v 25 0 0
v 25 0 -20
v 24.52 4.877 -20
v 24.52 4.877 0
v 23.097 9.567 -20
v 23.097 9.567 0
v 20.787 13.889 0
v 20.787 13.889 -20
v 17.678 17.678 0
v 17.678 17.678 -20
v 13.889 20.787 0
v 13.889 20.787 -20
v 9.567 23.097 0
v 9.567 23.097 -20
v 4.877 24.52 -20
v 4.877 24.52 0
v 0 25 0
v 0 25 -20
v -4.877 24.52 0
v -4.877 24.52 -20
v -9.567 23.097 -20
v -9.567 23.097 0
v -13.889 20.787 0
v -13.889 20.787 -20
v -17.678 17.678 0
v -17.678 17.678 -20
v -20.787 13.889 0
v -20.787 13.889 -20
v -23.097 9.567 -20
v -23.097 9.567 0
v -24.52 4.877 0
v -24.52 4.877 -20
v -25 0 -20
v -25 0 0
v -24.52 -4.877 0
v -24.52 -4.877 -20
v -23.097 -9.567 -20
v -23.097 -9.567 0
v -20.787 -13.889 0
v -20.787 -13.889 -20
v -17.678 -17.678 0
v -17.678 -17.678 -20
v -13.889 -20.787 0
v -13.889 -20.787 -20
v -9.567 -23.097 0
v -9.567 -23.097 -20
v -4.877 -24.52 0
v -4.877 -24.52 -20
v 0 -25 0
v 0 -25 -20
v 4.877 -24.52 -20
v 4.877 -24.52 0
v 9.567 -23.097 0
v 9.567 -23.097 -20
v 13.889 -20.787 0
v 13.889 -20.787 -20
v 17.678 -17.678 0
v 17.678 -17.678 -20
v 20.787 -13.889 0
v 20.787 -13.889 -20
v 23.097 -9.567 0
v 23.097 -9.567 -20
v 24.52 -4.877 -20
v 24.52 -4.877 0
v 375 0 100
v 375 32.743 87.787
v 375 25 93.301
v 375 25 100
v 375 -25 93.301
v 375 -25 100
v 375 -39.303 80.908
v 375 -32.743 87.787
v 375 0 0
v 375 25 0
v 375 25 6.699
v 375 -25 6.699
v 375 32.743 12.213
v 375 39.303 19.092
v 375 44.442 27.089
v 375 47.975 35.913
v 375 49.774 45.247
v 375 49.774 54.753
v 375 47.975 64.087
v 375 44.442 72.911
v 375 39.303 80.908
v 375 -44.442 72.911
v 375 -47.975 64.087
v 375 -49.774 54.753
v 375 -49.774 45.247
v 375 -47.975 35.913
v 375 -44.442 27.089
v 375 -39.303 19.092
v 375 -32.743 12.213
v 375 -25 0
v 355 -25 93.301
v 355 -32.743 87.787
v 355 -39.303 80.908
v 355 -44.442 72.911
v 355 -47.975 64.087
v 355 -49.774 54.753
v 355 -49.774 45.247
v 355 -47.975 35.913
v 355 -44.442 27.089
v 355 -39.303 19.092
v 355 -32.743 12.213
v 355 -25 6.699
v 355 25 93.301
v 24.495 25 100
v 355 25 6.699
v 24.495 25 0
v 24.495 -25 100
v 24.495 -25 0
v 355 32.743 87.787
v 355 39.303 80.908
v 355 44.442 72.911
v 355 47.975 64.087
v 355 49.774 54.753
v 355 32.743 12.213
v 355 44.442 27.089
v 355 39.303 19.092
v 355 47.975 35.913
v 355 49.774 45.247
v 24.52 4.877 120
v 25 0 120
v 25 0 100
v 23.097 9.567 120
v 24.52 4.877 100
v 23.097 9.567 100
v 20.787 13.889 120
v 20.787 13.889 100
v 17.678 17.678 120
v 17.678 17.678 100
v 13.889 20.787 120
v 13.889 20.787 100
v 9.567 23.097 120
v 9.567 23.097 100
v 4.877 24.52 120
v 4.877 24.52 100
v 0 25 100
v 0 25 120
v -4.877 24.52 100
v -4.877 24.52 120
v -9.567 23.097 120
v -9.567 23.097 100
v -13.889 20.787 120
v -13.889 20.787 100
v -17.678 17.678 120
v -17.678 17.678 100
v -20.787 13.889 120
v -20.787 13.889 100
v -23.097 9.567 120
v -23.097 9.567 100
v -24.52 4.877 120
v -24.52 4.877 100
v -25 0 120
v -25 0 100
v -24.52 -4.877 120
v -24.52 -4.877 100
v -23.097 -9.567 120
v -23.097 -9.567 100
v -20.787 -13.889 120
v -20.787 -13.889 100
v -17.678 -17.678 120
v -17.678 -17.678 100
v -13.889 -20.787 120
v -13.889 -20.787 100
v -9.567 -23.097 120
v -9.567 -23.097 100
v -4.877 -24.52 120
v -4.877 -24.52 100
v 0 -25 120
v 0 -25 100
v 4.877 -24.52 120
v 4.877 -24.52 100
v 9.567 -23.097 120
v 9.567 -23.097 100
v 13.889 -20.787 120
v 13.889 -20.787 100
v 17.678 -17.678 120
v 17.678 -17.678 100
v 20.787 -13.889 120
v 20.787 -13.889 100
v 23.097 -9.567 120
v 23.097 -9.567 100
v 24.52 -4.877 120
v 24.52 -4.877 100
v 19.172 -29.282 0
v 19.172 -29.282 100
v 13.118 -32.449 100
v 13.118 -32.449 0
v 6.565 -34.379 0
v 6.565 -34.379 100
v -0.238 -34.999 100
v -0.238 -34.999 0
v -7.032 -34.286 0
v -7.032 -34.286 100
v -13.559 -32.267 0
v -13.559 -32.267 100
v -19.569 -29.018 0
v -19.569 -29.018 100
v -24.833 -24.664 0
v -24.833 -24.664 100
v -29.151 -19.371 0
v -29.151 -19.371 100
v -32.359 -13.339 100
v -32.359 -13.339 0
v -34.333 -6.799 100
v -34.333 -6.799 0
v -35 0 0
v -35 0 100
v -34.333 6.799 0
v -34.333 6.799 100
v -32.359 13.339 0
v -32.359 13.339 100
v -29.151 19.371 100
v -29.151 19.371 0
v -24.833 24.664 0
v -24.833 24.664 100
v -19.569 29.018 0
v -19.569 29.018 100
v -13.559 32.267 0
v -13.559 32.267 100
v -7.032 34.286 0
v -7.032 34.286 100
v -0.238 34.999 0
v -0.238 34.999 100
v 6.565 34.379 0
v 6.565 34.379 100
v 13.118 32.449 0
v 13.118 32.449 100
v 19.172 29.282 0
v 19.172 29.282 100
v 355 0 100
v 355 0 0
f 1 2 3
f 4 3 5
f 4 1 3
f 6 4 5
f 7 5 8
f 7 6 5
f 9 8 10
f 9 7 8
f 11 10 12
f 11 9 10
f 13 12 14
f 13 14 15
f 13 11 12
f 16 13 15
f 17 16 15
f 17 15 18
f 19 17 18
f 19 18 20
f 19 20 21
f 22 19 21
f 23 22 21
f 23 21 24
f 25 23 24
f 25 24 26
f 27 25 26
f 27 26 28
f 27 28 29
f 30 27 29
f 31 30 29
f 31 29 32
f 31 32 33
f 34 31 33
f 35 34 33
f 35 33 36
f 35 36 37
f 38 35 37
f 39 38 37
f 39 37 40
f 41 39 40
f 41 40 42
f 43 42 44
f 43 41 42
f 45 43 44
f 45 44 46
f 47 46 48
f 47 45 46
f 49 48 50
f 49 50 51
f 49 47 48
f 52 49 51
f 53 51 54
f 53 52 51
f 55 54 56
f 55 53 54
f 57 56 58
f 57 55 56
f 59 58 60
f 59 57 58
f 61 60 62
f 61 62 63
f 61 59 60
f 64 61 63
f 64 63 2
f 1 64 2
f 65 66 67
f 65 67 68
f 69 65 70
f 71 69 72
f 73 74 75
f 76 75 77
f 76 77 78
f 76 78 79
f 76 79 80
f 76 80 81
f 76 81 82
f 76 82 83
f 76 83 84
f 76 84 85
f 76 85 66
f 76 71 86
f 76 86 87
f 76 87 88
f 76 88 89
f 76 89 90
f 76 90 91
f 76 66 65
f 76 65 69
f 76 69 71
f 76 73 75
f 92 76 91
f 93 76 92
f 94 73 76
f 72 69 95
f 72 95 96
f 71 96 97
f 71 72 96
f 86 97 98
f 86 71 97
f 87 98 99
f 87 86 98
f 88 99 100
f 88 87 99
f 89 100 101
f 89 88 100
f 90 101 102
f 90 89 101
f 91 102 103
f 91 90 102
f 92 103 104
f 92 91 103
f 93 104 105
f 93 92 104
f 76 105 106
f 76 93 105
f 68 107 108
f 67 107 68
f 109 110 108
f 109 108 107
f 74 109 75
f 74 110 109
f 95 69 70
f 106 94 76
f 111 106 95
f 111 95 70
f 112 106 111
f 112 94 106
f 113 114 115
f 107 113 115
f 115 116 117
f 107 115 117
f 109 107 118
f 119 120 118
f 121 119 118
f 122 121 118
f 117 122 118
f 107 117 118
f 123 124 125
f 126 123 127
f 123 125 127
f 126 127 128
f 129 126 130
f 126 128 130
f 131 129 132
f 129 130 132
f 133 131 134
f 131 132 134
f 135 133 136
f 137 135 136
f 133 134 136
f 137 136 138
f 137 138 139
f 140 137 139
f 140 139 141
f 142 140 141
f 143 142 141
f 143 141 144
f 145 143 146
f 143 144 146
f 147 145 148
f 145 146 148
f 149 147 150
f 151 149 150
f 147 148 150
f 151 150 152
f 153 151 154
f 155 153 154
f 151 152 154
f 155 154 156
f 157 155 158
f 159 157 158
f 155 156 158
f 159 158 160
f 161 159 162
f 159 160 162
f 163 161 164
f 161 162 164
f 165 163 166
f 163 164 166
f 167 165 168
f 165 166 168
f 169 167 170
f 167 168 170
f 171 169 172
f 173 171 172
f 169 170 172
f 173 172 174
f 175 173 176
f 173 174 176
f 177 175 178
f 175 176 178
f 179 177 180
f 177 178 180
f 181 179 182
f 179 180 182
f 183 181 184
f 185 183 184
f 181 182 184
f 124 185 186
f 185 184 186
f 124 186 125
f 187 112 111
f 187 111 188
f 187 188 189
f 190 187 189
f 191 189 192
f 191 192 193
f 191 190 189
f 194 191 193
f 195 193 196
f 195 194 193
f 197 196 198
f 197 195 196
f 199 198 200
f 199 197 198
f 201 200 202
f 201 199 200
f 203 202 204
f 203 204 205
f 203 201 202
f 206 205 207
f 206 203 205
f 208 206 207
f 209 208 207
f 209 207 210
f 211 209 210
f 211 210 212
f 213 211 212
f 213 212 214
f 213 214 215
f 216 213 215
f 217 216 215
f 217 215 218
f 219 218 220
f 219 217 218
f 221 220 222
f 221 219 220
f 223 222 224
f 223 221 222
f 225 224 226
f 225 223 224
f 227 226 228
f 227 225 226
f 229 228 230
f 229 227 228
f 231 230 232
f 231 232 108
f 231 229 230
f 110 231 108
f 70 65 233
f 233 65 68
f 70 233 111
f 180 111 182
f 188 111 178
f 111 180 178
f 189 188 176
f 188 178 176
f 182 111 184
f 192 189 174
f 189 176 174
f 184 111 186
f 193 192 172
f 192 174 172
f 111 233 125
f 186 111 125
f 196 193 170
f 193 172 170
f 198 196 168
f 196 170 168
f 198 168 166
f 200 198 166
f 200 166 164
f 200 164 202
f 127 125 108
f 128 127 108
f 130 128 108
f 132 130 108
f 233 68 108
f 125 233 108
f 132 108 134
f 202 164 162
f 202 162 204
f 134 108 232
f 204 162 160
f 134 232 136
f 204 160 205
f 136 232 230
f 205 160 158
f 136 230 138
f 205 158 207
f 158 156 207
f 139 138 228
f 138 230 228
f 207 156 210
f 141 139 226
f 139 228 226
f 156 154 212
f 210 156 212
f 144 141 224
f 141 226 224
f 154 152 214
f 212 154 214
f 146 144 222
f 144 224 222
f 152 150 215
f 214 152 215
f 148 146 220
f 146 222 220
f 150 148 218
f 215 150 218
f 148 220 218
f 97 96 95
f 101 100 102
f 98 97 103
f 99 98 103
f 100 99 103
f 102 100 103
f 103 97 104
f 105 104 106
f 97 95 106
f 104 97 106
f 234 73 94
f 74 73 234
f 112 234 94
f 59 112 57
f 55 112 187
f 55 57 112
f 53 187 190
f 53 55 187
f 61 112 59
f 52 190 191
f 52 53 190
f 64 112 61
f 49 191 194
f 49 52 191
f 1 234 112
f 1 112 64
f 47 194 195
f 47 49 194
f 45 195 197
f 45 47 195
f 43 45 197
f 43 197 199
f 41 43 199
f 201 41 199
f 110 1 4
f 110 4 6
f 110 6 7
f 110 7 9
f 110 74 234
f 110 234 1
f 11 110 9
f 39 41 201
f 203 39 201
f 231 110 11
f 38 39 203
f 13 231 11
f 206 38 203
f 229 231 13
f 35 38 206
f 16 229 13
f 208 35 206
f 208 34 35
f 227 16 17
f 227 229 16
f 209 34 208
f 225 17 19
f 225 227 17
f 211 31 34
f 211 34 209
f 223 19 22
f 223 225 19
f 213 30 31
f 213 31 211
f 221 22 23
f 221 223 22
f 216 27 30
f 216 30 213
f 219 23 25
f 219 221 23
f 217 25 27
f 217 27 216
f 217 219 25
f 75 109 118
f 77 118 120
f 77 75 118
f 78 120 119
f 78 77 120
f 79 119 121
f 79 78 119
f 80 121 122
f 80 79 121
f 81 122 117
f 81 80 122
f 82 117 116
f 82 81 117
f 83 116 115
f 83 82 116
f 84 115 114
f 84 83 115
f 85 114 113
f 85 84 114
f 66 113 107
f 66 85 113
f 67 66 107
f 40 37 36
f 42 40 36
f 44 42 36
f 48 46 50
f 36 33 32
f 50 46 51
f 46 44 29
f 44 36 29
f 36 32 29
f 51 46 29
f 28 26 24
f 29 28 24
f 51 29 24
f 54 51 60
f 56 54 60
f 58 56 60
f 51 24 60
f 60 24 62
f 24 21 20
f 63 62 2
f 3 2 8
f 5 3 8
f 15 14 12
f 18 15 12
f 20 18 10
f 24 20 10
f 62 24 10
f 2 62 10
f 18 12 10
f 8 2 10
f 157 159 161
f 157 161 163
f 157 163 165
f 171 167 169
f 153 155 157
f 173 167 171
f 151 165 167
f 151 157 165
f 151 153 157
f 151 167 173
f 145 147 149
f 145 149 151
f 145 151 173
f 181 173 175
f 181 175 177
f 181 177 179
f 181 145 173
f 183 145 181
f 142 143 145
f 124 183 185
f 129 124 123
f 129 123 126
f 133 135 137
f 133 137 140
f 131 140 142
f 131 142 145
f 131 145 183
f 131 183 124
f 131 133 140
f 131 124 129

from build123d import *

# Parameters (mm, degrees)
BOSS_EXTRUDE1_DEPTH      = 100
SKETCH2_R                = 50
BOSS_EXTRUDE2_DEPTH      = 20
SKETCH3_R                = 25
BOSS_EXTRUDE3_DEPTH      = 20
BOSS_EXTRUDE3_DEPTH_BACK = 120


with BuildPart() as part:
    # Sketch1 → Boss-Extrude1 (new body)
    with BuildSketch(Plane.XY):
        with BuildLine():
            Line((24.494897428, 25), (375, 25))
            Line((375, 25), (375, -25))
            Line((375, -25), (24.494897428, -25))
            ThreePointArc((24.494897428, -25), (-35, 0), (24.494897428, 25))
        make_face()
    extrude(amount=BOSS_EXTRUDE1_DEPTH)

    # Sketch2 → Boss-Extrude2 (add)
    with BuildSketch(Plane(origin=(375, 0, 0), x_dir=(0, 0, -1), z_dir=(1, 0, 0))):
        with Locations((-50, 0)):
            Circle(SKETCH2_R)
    extrude(amount=-BOSS_EXTRUDE2_DEPTH)

    # Sketch3 → Boss-Extrude3 (add, two sides)
    with BuildSketch(Plane.XY.offset(100)) as boss_extrude3_sk:
        Circle(SKETCH3_R)
    extrude(amount=BOSS_EXTRUDE3_DEPTH)
    extrude(boss_extrude3_sk.sketch, amount=-BOSS_EXTRUDE3_DEPTH_BACK)


solid = part.part
